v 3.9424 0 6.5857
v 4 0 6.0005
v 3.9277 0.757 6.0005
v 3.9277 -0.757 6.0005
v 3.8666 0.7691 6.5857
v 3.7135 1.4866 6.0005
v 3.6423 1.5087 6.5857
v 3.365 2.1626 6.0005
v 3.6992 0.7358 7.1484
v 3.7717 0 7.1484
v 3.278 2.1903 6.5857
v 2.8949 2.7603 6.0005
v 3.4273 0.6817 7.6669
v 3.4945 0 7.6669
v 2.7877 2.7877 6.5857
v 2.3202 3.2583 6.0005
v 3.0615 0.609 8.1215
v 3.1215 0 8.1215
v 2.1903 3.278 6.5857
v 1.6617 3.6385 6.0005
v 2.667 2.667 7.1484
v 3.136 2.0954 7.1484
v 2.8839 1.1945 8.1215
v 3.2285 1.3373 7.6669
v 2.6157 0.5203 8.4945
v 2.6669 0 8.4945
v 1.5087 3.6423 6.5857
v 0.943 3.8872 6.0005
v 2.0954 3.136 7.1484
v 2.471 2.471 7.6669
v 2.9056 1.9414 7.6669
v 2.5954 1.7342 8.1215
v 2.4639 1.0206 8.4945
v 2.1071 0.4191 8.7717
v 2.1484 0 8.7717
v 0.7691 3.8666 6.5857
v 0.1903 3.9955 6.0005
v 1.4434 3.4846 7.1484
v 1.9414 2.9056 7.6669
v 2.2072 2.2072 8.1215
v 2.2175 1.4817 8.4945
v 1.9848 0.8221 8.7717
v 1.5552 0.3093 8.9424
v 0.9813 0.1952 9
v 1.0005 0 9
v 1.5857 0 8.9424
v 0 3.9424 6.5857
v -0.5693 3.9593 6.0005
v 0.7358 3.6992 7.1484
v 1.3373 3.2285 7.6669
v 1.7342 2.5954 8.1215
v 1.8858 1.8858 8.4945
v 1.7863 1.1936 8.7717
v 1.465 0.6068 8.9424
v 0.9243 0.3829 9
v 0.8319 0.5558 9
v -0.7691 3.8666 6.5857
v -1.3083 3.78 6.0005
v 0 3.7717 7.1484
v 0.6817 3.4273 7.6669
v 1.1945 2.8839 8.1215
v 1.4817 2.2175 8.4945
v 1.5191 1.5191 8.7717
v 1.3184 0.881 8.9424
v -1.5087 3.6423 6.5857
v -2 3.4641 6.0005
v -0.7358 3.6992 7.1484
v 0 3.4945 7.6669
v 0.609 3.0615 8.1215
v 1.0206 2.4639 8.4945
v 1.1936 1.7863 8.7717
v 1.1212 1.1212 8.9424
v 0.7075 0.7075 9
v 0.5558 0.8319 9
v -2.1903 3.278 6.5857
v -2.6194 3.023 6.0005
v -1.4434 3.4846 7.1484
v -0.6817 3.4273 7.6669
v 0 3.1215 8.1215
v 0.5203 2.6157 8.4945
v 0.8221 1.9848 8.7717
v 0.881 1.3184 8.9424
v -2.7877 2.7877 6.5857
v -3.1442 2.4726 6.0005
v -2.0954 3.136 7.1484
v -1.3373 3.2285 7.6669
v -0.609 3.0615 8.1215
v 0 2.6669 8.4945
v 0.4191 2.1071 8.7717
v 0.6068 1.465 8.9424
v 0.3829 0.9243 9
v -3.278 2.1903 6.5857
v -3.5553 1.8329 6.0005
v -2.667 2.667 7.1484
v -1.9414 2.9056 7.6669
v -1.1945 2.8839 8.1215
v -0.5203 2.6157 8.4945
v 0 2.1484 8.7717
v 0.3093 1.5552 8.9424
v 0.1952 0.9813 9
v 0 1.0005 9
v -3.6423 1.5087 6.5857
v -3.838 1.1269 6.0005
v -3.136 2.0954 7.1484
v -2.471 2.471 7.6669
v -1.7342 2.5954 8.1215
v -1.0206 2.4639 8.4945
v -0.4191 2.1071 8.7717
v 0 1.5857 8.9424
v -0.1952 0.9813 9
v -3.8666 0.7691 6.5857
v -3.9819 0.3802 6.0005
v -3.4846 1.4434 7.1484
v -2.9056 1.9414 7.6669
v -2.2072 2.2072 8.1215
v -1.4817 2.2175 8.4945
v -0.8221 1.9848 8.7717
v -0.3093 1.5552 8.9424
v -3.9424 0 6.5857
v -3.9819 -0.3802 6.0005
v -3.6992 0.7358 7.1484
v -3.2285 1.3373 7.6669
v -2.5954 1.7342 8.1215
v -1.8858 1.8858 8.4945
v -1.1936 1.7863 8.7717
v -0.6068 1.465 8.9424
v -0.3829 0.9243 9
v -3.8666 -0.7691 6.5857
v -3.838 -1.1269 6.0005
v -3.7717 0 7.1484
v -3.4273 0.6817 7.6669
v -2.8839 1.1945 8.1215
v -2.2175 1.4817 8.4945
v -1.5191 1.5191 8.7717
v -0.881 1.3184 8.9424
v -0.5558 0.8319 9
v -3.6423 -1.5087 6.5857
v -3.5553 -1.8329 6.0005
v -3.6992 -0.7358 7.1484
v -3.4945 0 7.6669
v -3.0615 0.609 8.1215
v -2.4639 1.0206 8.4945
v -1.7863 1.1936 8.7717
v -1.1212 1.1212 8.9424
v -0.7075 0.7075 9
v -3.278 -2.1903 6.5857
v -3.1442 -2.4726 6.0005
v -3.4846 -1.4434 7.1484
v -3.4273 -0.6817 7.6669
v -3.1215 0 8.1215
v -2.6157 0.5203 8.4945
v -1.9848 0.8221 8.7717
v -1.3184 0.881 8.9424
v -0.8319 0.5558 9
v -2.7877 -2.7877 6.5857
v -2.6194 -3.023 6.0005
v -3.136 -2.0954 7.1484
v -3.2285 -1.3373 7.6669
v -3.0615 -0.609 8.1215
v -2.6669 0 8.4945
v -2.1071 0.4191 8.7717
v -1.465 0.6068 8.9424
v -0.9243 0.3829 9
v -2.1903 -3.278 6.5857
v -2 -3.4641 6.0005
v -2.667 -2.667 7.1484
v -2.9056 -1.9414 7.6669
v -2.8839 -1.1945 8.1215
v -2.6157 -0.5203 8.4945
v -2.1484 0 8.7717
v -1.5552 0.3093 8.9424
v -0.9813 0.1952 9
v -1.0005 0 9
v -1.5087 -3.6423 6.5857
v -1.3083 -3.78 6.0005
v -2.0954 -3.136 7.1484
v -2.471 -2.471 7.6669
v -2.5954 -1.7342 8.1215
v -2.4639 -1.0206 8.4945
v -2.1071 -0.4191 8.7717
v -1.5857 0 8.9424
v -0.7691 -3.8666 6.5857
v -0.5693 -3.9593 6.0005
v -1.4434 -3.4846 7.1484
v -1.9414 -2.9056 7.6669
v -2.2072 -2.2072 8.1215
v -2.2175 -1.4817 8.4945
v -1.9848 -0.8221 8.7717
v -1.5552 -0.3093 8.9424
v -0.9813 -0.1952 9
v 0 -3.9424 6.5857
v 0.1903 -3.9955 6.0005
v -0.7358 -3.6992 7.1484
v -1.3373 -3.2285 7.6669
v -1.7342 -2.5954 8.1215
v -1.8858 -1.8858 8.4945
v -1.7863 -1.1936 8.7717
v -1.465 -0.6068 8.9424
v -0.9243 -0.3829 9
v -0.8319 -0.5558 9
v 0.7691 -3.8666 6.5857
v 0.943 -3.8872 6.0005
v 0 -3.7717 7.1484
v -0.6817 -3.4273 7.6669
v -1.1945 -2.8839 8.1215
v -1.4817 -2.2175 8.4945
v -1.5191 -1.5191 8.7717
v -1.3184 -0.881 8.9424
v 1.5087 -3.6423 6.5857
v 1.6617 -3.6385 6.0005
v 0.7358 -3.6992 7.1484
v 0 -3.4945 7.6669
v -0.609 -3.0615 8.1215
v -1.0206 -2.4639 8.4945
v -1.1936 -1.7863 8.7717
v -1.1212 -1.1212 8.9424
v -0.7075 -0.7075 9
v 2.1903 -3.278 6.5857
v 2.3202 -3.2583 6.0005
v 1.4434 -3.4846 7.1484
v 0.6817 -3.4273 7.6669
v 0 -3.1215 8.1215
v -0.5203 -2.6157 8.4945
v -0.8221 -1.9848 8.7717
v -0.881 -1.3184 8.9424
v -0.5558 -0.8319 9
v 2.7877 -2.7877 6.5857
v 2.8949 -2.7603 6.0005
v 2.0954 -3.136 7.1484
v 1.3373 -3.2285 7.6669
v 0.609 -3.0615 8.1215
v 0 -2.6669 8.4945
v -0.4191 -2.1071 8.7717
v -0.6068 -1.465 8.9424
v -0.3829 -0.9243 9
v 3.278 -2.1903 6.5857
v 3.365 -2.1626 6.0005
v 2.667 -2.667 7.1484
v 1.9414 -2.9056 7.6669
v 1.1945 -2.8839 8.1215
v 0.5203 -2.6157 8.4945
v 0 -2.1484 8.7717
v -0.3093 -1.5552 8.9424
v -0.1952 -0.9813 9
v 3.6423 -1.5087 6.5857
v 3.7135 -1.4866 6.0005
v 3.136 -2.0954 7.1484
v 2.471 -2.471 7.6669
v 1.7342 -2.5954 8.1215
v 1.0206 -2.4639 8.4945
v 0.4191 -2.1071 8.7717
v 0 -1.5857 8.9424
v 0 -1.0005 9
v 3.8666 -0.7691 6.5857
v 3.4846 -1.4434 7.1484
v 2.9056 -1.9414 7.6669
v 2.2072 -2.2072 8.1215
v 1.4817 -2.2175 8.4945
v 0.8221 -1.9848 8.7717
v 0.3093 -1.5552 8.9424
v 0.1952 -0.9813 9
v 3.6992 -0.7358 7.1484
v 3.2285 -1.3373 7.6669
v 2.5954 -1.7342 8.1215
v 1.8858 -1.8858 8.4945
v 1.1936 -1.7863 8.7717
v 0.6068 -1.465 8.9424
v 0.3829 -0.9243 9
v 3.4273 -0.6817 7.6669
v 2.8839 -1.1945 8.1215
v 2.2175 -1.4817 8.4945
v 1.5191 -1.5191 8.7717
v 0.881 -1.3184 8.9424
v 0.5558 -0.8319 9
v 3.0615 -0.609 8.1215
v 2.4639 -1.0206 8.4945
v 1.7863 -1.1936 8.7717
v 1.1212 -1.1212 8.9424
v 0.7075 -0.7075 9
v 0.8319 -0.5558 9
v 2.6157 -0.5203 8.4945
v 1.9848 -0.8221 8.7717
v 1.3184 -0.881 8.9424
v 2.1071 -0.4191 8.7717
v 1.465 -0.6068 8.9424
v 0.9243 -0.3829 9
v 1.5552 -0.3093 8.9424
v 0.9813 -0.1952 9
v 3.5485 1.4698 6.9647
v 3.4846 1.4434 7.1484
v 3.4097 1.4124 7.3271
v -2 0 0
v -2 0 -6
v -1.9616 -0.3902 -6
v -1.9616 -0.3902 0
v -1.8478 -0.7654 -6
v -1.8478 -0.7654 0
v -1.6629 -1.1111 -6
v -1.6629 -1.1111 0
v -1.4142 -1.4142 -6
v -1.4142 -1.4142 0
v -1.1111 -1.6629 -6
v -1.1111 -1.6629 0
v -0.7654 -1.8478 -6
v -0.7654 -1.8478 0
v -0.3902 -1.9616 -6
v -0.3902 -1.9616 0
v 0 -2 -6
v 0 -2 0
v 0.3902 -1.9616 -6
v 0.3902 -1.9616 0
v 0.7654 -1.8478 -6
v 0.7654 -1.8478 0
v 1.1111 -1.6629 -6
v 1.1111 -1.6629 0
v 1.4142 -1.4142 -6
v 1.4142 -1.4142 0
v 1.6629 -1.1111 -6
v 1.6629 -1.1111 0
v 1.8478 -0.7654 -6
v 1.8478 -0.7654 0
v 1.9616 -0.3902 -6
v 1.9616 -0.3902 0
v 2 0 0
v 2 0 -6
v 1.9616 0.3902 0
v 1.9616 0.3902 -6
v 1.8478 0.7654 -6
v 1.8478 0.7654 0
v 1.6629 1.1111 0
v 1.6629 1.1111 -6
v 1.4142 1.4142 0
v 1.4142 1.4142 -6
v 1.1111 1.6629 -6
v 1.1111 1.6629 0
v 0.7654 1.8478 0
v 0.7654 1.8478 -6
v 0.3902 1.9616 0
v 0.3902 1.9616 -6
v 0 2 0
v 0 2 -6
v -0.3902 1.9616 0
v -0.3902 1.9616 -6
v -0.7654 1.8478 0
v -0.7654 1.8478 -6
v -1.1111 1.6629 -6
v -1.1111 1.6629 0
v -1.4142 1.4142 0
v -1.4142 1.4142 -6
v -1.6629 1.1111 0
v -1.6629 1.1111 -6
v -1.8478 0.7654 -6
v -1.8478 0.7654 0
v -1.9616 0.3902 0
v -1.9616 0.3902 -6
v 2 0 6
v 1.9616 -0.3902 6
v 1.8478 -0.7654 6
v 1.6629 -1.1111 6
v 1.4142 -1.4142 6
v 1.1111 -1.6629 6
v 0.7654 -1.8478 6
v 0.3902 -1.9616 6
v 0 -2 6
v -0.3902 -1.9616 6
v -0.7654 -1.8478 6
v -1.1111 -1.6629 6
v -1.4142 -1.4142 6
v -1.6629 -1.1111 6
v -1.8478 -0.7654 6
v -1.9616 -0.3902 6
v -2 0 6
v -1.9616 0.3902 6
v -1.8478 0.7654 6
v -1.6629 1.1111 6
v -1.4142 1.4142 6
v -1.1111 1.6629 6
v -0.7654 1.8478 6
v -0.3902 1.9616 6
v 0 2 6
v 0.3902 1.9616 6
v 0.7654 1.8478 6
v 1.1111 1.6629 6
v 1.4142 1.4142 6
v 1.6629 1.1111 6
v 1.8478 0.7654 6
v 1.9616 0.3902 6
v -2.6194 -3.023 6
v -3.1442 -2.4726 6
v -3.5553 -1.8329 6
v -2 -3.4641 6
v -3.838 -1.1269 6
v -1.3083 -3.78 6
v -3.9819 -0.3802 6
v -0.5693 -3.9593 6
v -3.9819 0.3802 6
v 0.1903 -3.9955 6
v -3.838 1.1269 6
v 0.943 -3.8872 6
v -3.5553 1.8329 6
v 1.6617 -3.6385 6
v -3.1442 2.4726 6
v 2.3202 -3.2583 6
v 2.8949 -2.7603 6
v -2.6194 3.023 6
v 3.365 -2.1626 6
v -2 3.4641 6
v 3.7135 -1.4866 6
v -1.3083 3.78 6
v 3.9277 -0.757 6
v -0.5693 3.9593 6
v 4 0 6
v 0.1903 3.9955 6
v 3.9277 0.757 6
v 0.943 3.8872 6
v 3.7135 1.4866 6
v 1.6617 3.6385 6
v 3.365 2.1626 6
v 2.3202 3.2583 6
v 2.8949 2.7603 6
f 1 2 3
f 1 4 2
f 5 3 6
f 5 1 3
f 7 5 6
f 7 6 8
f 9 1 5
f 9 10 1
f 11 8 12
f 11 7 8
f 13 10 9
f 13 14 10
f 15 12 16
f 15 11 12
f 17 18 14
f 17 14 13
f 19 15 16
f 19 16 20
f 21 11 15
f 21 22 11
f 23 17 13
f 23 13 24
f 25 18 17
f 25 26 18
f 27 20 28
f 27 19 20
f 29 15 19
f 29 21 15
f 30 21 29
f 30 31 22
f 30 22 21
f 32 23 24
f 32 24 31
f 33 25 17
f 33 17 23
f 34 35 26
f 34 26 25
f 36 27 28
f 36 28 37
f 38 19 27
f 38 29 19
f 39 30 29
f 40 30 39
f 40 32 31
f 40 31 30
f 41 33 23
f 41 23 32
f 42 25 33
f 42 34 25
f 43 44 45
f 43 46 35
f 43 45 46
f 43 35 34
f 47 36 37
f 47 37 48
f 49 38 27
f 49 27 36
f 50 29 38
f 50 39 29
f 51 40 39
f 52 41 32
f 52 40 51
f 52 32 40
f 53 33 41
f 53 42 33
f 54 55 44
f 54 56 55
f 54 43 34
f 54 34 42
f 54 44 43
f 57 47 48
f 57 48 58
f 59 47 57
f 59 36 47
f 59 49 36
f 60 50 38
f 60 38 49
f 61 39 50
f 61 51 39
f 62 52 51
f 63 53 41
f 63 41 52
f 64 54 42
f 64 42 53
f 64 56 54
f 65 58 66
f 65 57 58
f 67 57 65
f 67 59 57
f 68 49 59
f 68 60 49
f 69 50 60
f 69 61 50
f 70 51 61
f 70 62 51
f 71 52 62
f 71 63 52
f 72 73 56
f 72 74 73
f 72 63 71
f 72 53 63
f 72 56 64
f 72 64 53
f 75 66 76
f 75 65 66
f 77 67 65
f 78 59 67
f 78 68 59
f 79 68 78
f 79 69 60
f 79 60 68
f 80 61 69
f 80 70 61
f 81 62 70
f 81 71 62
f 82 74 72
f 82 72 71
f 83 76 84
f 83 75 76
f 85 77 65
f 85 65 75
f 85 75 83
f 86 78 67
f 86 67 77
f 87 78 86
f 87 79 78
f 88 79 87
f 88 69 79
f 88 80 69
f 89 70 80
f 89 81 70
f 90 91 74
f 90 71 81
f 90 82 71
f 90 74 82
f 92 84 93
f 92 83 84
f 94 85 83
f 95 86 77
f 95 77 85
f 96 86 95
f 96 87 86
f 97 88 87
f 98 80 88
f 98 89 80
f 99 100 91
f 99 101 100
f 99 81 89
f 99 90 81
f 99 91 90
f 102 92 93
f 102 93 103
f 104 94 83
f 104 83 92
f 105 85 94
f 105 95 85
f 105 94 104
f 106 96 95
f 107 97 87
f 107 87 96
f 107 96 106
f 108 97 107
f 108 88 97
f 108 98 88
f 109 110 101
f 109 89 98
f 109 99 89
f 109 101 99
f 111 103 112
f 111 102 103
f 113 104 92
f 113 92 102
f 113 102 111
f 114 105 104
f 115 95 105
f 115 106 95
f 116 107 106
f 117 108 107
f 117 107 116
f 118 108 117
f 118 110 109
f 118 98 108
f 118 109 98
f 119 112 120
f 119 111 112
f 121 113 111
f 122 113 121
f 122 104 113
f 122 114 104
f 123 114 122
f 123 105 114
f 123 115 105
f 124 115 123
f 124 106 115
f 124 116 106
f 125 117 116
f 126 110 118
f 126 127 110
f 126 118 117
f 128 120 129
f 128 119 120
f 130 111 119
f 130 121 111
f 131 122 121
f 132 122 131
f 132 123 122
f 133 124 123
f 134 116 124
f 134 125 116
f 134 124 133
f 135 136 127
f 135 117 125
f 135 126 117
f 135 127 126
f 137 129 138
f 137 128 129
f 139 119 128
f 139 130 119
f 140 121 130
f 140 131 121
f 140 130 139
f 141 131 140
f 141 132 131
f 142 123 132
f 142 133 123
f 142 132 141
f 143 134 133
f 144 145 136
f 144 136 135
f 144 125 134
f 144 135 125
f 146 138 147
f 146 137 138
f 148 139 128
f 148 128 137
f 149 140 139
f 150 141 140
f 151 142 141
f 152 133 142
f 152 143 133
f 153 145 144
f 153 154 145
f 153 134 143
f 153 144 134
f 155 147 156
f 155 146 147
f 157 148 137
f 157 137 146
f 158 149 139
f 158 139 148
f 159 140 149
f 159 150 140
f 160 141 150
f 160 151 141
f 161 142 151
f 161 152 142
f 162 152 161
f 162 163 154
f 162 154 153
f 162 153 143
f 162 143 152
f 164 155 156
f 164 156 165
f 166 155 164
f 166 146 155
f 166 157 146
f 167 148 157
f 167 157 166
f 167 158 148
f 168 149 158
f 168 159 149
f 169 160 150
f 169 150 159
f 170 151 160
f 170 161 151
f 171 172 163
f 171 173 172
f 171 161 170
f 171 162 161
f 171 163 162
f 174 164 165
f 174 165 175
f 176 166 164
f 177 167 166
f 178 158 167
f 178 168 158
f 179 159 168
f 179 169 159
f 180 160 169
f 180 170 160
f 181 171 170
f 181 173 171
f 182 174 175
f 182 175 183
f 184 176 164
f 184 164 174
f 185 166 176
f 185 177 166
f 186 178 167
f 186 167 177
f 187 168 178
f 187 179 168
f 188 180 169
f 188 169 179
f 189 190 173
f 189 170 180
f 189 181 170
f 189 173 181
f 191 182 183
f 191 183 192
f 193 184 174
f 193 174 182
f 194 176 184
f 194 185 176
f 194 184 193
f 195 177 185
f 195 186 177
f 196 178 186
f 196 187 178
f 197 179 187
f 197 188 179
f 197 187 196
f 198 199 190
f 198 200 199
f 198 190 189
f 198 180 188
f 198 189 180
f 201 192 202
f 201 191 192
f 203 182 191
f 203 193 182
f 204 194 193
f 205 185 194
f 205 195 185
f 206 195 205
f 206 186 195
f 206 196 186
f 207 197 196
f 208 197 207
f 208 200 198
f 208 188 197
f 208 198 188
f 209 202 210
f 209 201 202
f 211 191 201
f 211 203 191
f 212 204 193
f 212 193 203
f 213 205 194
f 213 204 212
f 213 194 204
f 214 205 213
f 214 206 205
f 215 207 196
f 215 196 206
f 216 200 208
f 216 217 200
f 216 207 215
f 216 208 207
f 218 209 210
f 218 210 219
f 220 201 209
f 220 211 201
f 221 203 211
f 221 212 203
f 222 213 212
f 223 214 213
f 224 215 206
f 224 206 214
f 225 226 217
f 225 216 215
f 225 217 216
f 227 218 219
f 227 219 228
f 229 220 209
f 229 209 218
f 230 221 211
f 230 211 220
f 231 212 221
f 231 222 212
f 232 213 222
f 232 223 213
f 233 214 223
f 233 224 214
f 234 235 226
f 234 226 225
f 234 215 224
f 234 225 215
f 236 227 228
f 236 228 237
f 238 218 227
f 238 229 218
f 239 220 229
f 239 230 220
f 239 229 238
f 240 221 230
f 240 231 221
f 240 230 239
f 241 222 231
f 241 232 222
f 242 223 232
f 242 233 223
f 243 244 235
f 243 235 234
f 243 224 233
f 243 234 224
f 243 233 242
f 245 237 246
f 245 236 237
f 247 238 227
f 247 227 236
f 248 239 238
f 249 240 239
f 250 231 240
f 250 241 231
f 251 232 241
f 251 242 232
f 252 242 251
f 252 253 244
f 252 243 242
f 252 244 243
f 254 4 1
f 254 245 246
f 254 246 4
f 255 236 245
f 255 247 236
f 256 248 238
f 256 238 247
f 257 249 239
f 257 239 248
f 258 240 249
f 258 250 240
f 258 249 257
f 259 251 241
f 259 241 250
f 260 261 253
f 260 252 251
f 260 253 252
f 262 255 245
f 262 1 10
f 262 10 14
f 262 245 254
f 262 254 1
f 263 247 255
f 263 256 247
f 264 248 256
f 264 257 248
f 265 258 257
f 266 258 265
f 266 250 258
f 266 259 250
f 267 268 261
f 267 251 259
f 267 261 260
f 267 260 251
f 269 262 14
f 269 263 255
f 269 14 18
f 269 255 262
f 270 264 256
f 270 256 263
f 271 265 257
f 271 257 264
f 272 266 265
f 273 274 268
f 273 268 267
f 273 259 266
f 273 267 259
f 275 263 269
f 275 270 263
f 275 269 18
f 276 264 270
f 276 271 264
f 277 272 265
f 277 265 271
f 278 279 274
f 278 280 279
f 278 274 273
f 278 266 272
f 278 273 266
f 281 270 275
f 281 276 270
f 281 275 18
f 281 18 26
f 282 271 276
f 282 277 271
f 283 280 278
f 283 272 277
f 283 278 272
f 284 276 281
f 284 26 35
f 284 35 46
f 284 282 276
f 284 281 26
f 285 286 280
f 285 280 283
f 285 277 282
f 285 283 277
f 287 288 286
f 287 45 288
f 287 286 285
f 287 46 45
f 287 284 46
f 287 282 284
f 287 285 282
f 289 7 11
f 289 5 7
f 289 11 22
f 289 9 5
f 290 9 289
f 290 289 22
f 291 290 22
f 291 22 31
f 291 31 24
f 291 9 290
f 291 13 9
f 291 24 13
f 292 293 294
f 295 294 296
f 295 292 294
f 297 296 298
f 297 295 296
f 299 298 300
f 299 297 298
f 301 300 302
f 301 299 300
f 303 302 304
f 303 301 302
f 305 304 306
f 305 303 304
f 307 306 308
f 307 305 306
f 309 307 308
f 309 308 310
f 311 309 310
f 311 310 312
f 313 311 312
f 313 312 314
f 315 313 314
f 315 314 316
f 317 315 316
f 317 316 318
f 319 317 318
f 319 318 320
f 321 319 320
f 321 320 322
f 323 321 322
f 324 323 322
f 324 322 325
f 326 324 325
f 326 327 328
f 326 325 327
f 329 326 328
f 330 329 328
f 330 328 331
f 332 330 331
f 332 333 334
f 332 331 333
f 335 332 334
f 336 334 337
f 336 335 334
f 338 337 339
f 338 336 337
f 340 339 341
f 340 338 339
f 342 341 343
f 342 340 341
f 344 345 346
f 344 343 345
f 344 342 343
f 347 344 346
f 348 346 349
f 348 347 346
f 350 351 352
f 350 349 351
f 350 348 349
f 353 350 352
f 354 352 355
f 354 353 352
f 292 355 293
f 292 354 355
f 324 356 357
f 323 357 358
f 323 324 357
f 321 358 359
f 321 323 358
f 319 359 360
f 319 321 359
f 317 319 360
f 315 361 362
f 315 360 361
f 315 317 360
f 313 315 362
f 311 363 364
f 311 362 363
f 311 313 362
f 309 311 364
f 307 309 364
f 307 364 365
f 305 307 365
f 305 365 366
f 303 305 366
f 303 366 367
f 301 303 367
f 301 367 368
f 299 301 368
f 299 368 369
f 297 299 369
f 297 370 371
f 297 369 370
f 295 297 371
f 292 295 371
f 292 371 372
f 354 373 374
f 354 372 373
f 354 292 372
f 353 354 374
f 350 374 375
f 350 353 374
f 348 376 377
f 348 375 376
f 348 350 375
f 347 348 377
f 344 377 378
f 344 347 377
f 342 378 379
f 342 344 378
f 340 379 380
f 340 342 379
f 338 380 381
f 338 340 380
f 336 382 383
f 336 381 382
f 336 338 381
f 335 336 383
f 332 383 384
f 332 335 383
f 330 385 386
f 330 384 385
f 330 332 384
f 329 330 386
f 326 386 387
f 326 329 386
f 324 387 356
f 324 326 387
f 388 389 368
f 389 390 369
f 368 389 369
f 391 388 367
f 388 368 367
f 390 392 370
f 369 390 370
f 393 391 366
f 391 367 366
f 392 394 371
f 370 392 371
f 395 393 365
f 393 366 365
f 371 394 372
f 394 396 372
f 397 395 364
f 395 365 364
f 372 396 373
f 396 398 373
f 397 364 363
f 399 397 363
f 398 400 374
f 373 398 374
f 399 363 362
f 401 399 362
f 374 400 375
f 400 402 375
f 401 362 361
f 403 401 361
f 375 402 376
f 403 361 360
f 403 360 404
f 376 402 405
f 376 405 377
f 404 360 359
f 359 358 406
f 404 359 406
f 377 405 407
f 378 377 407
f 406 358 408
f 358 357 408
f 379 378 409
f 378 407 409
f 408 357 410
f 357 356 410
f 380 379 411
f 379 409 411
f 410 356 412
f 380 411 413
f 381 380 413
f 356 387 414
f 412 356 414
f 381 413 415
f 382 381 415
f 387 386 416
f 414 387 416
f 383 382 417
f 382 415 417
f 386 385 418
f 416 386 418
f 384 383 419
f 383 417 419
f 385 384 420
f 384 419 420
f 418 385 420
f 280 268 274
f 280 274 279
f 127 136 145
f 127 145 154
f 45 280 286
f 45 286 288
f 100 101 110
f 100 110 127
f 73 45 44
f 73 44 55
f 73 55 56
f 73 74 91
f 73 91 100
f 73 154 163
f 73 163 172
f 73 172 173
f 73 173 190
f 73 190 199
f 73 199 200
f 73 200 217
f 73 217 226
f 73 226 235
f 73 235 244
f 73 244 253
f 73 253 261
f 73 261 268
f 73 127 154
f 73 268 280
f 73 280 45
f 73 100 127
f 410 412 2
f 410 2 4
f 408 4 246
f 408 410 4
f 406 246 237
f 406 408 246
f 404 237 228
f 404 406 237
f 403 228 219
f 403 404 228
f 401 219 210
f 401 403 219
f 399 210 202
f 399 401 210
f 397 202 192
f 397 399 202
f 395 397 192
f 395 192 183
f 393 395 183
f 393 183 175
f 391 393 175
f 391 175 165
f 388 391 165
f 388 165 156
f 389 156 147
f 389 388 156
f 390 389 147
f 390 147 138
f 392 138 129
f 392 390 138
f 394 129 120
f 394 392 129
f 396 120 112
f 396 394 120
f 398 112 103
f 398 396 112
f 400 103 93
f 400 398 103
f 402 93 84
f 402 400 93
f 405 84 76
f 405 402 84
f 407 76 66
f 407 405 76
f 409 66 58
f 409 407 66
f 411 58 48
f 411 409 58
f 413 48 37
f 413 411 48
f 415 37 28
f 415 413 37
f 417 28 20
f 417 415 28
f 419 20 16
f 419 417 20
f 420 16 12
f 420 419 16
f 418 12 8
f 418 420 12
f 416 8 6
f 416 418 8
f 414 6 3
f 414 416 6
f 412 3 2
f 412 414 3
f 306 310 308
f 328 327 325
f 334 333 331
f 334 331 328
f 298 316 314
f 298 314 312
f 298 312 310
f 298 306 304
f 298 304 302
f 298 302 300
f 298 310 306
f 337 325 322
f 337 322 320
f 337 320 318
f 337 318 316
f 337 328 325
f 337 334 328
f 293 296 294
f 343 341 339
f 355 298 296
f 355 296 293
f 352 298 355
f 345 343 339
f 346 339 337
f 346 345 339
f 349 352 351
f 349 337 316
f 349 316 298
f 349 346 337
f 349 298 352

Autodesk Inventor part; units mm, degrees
ref_plane "YZ Plane" through (0, 0, 0) normal (1, 0, 0) x (0, 1, 0)
ref_plane "XZ Plane" through (0, 0, 0) normal (0, 1, 0) x (-1, 0, 0)
ref_plane "XY Plane" through (0, 0, 0) normal (0, 0, 1) x (1, 0, 0)
sketch "スケッチ1" plane through (0, 0, 0) normal (0, 0, 1) x (1, 0, 0)
  circle A0 centre (0, 0) radius 2
  dimension "d0" = 4
extrude "押し出し1" add sketch "スケッチ1" along normal blind 6
sketch "スケッチ2" plane through (0, 0, 6) normal (0, 0, 1) x (1, 0, 0)
  circle A0 centre (0, 0) radius 2 projected
  circle A1 centre (0, 0) radius 4
  dimension "d3" = 8
extrude "押し出し2" add sketch "スケッチ2" along normal blind 3 contours A0 | A1
fillet "フィレット1" radius 3 1 edges at (-4, 0, 9)
thread "ねじ1" size "M4x0.7" class "6g" standard "ANSI Metric M Profile" full length
sketch "スケッチ3" plane through (0, 0, 0) normal (0, 0, -1) x (-1, 0, 0)
  circle A0 centre (0, 0) radius 2
extrude "押し出し3" add sketch "スケッチ3" along normal blind 6
properties part number "SB　M4 12mm なべネジ" material "Stainless Steel, 440C"
